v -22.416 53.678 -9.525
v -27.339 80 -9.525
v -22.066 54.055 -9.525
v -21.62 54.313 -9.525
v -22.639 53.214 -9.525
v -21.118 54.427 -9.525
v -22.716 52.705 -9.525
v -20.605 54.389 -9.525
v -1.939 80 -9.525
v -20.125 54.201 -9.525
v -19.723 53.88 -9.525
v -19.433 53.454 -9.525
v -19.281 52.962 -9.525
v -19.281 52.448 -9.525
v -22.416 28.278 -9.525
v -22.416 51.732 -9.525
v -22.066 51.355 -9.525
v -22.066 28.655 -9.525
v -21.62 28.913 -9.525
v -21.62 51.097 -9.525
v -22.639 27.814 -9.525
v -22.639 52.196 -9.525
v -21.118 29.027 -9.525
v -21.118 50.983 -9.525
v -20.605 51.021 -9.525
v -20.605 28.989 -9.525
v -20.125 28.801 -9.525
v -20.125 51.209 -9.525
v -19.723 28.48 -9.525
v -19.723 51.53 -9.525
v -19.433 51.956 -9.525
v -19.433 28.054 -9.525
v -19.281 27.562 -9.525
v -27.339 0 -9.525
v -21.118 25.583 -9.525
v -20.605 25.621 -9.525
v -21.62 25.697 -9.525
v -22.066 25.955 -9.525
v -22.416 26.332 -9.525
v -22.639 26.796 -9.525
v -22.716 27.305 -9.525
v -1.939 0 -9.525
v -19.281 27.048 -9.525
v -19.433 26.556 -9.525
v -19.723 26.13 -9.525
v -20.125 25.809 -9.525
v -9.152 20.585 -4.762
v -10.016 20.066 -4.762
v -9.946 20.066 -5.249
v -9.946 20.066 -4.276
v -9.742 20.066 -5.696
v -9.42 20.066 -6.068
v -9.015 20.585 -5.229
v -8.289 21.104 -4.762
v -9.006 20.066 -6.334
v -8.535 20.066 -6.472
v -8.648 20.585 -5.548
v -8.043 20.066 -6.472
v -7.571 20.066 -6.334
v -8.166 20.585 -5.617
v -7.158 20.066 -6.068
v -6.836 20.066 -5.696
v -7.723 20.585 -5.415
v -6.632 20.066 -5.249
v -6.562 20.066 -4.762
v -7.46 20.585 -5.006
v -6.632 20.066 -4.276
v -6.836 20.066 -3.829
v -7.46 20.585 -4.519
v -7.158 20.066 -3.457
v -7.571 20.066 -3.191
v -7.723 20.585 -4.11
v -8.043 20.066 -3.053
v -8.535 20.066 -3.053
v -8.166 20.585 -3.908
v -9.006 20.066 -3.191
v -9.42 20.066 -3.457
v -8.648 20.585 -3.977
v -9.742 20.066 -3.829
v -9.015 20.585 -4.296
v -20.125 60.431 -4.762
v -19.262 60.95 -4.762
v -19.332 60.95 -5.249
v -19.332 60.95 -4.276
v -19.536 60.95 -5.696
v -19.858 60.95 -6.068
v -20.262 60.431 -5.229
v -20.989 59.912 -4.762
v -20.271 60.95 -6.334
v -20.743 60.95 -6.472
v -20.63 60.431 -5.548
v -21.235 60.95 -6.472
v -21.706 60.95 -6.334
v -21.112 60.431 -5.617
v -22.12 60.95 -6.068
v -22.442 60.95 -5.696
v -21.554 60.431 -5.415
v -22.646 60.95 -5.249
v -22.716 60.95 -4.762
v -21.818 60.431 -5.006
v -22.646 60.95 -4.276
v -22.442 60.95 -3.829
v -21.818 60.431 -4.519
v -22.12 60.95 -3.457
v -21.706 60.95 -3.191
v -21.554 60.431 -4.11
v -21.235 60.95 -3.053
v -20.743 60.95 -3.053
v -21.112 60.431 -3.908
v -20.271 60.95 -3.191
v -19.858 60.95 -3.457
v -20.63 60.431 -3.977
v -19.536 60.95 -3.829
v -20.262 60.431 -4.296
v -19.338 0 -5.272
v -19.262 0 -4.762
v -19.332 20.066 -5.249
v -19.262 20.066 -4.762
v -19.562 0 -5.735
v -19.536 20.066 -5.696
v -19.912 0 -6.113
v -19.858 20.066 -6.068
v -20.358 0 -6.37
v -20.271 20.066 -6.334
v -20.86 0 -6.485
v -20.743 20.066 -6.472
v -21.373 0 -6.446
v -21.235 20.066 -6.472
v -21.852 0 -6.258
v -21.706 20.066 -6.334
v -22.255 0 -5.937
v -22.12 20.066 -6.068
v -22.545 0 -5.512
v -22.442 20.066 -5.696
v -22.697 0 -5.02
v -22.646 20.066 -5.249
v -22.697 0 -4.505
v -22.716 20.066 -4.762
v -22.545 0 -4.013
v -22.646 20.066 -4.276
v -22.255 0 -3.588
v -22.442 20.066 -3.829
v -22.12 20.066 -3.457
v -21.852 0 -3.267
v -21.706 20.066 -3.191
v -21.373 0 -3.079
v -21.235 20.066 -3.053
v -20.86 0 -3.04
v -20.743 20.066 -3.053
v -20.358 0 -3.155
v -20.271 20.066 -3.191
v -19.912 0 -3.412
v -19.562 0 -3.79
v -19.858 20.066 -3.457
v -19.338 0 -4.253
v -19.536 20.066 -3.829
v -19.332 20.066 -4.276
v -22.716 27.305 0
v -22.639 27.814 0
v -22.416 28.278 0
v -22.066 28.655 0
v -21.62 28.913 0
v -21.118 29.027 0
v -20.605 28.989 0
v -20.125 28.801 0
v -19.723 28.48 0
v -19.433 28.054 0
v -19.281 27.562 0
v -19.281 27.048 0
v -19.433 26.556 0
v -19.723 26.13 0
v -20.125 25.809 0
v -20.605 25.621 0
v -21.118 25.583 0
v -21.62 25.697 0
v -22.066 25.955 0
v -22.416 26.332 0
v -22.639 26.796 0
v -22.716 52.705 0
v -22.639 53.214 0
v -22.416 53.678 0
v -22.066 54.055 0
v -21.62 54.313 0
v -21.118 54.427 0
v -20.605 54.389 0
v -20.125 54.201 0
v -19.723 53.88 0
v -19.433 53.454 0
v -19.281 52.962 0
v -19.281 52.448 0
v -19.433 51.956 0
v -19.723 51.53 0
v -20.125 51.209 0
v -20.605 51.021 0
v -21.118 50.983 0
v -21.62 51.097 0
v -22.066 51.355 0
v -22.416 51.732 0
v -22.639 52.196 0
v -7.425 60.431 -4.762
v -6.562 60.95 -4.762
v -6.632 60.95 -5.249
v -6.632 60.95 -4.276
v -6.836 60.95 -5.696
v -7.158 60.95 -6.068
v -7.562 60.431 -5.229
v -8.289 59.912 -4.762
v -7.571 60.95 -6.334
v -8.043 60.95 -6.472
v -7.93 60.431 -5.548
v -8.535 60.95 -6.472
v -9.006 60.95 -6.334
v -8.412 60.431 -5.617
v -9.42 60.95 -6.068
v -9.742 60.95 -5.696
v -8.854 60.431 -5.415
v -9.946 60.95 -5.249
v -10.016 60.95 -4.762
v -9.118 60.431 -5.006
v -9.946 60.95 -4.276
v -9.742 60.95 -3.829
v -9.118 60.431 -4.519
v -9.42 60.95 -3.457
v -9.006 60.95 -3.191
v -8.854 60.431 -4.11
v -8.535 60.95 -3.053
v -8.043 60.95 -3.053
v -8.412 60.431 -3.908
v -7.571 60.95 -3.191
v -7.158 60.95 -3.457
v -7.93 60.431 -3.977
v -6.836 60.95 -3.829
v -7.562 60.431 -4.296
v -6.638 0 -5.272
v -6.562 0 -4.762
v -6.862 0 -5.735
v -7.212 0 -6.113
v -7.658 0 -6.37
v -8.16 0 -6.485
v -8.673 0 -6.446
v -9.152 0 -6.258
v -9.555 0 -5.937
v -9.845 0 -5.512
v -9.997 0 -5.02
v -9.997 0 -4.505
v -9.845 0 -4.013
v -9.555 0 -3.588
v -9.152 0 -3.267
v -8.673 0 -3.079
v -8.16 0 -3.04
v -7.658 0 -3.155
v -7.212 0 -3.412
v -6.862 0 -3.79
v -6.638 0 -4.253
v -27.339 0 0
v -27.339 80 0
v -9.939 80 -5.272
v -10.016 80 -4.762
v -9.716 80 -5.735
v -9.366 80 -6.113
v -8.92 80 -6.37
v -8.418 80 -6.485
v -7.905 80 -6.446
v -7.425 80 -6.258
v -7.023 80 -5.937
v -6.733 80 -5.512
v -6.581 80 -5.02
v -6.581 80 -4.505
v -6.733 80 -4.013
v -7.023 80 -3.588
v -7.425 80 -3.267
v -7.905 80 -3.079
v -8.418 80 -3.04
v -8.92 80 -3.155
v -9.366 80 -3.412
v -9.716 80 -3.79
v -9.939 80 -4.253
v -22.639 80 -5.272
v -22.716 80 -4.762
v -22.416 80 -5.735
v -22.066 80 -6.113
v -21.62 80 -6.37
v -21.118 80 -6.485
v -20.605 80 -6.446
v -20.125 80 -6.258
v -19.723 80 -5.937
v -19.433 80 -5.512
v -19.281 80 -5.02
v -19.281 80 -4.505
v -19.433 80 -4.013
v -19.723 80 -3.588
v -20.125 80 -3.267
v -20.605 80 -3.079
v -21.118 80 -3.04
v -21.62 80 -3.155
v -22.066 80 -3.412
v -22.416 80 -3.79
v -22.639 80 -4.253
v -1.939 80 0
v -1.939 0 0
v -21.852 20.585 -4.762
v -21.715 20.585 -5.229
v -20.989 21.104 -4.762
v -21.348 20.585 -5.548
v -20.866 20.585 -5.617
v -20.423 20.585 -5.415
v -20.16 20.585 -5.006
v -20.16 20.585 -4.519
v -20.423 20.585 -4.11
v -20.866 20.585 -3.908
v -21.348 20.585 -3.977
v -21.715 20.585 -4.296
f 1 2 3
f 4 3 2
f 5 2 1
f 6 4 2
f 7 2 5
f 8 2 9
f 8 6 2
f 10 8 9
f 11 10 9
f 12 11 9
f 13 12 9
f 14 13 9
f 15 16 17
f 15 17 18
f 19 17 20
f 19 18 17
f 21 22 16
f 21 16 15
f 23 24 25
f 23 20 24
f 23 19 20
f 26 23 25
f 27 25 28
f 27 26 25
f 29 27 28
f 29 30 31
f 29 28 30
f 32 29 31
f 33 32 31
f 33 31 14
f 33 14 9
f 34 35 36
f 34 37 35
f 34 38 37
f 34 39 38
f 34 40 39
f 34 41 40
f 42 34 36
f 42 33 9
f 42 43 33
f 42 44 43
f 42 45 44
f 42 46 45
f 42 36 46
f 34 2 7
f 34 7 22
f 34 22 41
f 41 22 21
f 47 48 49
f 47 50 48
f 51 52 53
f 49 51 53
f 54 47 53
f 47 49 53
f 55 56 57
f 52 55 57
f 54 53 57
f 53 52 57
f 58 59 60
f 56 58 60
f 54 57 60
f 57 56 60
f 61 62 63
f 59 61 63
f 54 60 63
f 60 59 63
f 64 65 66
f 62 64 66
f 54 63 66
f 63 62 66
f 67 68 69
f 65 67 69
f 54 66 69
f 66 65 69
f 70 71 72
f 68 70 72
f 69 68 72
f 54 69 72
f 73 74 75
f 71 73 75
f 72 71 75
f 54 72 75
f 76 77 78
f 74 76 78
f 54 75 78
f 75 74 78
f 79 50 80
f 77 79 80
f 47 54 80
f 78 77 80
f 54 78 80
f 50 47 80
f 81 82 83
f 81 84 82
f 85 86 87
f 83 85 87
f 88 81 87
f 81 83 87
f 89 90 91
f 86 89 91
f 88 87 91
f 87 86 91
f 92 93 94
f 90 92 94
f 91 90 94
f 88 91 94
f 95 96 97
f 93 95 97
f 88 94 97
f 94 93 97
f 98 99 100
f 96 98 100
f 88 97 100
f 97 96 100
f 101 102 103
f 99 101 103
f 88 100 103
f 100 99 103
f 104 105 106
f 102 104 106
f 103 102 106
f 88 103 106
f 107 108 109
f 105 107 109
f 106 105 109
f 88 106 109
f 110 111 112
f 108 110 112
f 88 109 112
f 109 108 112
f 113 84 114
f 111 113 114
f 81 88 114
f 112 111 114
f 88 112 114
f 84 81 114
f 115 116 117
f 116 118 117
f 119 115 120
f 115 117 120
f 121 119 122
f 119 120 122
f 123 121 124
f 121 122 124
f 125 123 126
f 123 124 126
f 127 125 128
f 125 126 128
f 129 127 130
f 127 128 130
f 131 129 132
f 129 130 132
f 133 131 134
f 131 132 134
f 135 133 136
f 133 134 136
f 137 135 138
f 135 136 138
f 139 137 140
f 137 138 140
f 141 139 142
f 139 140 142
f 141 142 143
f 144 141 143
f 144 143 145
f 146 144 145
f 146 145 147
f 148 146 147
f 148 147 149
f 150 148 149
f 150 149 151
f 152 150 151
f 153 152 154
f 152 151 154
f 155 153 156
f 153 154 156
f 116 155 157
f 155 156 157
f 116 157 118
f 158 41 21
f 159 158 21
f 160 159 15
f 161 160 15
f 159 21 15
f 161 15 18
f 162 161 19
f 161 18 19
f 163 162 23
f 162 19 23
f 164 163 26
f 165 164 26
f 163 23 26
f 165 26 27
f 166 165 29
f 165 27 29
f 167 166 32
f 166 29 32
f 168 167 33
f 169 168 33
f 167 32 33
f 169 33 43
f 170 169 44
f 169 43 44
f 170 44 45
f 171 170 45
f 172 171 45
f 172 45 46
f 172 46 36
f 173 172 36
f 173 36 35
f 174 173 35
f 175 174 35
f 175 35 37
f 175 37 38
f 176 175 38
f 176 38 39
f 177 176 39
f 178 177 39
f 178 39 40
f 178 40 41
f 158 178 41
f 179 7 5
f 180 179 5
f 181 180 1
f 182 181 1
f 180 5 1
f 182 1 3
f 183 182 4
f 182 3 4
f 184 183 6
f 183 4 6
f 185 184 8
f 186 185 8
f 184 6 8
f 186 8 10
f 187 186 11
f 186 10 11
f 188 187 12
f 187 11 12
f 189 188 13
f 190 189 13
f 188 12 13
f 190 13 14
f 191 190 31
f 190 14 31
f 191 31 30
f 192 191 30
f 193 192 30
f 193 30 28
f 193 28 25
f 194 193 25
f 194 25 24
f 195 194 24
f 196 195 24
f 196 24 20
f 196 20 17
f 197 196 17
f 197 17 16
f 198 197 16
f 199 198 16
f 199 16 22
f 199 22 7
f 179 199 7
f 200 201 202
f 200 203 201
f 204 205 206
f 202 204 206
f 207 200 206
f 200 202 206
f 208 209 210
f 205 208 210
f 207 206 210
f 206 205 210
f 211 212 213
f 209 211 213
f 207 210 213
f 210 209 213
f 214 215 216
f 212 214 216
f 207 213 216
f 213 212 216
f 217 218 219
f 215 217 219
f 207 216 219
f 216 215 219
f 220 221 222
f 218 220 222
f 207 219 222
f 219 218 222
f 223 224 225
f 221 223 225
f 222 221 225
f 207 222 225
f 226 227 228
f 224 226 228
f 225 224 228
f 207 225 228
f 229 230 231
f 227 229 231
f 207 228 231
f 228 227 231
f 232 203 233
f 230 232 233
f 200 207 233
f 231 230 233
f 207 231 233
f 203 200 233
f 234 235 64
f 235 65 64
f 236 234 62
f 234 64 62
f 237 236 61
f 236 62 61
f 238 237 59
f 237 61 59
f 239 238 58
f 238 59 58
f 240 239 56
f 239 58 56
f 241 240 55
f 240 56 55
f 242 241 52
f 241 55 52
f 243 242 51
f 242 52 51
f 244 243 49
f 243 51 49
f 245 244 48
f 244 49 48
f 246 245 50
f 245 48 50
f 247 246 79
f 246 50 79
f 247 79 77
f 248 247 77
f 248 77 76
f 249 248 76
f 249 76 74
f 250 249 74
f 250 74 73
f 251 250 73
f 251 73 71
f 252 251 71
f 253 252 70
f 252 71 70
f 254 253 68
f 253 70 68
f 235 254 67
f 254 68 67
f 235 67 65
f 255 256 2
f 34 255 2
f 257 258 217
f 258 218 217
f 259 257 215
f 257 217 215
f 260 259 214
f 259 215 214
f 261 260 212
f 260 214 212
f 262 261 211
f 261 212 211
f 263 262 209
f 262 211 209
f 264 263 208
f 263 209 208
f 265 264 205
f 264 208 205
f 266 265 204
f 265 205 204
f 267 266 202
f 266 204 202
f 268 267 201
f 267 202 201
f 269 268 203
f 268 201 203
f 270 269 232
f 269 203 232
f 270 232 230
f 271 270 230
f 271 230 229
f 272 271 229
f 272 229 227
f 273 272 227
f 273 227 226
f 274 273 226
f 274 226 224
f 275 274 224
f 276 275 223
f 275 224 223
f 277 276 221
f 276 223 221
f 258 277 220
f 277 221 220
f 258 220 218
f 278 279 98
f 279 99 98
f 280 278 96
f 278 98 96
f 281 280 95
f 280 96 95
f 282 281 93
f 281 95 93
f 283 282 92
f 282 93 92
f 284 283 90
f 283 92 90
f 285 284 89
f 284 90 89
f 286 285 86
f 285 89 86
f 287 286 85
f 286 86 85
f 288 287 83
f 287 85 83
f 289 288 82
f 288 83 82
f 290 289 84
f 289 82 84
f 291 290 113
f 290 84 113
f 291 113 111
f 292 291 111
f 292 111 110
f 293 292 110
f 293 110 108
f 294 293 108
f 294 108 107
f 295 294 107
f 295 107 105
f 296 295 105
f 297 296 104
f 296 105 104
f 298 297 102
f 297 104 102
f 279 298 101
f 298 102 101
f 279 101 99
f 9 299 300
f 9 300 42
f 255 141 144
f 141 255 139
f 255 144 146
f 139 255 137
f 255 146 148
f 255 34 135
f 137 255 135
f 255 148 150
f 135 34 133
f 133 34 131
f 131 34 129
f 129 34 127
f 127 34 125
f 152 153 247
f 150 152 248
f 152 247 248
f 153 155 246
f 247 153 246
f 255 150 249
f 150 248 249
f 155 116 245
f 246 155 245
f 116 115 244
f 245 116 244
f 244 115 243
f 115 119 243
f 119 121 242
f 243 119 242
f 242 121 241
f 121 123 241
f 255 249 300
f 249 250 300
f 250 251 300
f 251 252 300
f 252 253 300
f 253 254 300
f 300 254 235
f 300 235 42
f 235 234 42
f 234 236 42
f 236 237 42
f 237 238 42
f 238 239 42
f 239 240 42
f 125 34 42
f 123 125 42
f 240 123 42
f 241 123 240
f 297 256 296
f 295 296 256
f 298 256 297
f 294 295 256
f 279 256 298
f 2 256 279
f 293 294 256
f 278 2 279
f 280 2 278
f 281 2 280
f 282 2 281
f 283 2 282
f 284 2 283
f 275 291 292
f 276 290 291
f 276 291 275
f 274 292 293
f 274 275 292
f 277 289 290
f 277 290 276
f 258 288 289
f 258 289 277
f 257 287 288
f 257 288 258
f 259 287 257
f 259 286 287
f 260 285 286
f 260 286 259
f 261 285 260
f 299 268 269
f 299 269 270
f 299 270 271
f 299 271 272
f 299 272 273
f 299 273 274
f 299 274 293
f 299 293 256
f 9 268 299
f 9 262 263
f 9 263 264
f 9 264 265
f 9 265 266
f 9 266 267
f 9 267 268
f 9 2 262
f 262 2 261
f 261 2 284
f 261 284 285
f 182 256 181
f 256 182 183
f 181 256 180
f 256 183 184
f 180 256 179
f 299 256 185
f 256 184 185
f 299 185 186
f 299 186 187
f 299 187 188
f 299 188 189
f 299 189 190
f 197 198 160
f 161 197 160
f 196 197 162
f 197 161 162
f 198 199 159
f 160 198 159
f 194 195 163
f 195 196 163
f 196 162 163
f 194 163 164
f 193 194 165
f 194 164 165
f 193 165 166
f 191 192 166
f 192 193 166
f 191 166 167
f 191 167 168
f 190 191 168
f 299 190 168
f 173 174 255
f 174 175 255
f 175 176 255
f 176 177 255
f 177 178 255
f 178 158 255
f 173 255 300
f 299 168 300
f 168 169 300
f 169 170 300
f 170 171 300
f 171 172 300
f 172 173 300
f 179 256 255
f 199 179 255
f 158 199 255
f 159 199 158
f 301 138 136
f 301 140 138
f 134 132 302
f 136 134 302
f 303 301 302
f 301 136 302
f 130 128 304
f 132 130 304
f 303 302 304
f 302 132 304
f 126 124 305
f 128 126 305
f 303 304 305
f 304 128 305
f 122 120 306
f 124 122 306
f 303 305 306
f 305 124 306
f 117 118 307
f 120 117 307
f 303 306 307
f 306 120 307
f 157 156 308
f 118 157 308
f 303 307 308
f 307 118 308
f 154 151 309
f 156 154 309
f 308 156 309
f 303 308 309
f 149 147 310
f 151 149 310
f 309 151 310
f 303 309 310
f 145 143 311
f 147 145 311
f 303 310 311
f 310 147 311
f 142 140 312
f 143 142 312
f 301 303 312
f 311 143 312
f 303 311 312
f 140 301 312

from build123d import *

# Parameters (mm, degrees)
SKETCH1_W                 = 25.4
SKETCH1_H                 = 9.525
BOSS_EXTRUDE1_DEPTH       = 80
F_8_32_TAPPED_HOLE1_D     = 3.4544
F_8_32_TAPPED_HOLE1_DEPTH = 19.05
F_8_32_TAPPED_HOLE1_TIP   = 1.037806461
F_8_32_TAPPED_HOLE2_D     = 3.4544
F_8_32_TAPPED_HOLE2_DEPTH = 20.066
F_8_32_TAPPED_HOLE2_TIP   = 1.037806461
F_8_32_TAPPED_HOLE3_D     = 3.4544


with BuildPart() as part:
    # Sketch1 → Boss-Extrude1 (new body)
    with BuildSketch(Plane(origin=(0, 0, 0), x_dir=(1, 0, 0), z_dir=(0, 1, 0))):
        with Locations((-14.638893842, 4.7625)):
            Rectangle(SKETCH1_W, SKETCH1_H)
    extrude(amount=BOSS_EXTRUDE1_DEPTH)

    # #8-32 Tapped Hole1
    with Locations(Plane(origin=(0, 80, 0), x_dir=(1, 0, 0), z_dir=(0, 1, 0))):
        with Locations((-8.288893842, 4.7625), (-20.988893842, 4.7625)):
            Hole(F_8_32_TAPPED_HOLE1_D / 2, depth=F_8_32_TAPPED_HOLE1_DEPTH)
            with Locations((0, 0, -(F_8_32_TAPPED_HOLE1_DEPTH + F_8_32_TAPPED_HOLE1_TIP / 2))):  # 118° drill point
                Cone(0, F_8_32_TAPPED_HOLE1_D / 2, F_8_32_TAPPED_HOLE1_TIP, mode=Mode.SUBTRACT)

    # #8-32 Tapped Hole2
    with Locations(Plane(origin=(0, 0, 0), x_dir=(-1, 0, 0), z_dir=(0, -1, 0))):
        with Locations((20.988893842, 4.7625), (8.288893842, 4.7625)):
            Hole(F_8_32_TAPPED_HOLE2_D / 2, depth=F_8_32_TAPPED_HOLE2_DEPTH)
            with Locations((0, 0, -(F_8_32_TAPPED_HOLE2_DEPTH + F_8_32_TAPPED_HOLE2_TIP / 2))):  # 118° drill point
                Cone(0, F_8_32_TAPPED_HOLE2_D / 2, F_8_32_TAPPED_HOLE2_TIP, mode=Mode.SUBTRACT)

    # #8-32 Tapped Hole3 (through all)
    with Locations(Plane.XY):
        with Locations((-20.988893842, 52.705), (-20.988893842, 27.305)):
            Hole(F_8_32_TAPPED_HOLE3_D / 2)


solid = part.part
